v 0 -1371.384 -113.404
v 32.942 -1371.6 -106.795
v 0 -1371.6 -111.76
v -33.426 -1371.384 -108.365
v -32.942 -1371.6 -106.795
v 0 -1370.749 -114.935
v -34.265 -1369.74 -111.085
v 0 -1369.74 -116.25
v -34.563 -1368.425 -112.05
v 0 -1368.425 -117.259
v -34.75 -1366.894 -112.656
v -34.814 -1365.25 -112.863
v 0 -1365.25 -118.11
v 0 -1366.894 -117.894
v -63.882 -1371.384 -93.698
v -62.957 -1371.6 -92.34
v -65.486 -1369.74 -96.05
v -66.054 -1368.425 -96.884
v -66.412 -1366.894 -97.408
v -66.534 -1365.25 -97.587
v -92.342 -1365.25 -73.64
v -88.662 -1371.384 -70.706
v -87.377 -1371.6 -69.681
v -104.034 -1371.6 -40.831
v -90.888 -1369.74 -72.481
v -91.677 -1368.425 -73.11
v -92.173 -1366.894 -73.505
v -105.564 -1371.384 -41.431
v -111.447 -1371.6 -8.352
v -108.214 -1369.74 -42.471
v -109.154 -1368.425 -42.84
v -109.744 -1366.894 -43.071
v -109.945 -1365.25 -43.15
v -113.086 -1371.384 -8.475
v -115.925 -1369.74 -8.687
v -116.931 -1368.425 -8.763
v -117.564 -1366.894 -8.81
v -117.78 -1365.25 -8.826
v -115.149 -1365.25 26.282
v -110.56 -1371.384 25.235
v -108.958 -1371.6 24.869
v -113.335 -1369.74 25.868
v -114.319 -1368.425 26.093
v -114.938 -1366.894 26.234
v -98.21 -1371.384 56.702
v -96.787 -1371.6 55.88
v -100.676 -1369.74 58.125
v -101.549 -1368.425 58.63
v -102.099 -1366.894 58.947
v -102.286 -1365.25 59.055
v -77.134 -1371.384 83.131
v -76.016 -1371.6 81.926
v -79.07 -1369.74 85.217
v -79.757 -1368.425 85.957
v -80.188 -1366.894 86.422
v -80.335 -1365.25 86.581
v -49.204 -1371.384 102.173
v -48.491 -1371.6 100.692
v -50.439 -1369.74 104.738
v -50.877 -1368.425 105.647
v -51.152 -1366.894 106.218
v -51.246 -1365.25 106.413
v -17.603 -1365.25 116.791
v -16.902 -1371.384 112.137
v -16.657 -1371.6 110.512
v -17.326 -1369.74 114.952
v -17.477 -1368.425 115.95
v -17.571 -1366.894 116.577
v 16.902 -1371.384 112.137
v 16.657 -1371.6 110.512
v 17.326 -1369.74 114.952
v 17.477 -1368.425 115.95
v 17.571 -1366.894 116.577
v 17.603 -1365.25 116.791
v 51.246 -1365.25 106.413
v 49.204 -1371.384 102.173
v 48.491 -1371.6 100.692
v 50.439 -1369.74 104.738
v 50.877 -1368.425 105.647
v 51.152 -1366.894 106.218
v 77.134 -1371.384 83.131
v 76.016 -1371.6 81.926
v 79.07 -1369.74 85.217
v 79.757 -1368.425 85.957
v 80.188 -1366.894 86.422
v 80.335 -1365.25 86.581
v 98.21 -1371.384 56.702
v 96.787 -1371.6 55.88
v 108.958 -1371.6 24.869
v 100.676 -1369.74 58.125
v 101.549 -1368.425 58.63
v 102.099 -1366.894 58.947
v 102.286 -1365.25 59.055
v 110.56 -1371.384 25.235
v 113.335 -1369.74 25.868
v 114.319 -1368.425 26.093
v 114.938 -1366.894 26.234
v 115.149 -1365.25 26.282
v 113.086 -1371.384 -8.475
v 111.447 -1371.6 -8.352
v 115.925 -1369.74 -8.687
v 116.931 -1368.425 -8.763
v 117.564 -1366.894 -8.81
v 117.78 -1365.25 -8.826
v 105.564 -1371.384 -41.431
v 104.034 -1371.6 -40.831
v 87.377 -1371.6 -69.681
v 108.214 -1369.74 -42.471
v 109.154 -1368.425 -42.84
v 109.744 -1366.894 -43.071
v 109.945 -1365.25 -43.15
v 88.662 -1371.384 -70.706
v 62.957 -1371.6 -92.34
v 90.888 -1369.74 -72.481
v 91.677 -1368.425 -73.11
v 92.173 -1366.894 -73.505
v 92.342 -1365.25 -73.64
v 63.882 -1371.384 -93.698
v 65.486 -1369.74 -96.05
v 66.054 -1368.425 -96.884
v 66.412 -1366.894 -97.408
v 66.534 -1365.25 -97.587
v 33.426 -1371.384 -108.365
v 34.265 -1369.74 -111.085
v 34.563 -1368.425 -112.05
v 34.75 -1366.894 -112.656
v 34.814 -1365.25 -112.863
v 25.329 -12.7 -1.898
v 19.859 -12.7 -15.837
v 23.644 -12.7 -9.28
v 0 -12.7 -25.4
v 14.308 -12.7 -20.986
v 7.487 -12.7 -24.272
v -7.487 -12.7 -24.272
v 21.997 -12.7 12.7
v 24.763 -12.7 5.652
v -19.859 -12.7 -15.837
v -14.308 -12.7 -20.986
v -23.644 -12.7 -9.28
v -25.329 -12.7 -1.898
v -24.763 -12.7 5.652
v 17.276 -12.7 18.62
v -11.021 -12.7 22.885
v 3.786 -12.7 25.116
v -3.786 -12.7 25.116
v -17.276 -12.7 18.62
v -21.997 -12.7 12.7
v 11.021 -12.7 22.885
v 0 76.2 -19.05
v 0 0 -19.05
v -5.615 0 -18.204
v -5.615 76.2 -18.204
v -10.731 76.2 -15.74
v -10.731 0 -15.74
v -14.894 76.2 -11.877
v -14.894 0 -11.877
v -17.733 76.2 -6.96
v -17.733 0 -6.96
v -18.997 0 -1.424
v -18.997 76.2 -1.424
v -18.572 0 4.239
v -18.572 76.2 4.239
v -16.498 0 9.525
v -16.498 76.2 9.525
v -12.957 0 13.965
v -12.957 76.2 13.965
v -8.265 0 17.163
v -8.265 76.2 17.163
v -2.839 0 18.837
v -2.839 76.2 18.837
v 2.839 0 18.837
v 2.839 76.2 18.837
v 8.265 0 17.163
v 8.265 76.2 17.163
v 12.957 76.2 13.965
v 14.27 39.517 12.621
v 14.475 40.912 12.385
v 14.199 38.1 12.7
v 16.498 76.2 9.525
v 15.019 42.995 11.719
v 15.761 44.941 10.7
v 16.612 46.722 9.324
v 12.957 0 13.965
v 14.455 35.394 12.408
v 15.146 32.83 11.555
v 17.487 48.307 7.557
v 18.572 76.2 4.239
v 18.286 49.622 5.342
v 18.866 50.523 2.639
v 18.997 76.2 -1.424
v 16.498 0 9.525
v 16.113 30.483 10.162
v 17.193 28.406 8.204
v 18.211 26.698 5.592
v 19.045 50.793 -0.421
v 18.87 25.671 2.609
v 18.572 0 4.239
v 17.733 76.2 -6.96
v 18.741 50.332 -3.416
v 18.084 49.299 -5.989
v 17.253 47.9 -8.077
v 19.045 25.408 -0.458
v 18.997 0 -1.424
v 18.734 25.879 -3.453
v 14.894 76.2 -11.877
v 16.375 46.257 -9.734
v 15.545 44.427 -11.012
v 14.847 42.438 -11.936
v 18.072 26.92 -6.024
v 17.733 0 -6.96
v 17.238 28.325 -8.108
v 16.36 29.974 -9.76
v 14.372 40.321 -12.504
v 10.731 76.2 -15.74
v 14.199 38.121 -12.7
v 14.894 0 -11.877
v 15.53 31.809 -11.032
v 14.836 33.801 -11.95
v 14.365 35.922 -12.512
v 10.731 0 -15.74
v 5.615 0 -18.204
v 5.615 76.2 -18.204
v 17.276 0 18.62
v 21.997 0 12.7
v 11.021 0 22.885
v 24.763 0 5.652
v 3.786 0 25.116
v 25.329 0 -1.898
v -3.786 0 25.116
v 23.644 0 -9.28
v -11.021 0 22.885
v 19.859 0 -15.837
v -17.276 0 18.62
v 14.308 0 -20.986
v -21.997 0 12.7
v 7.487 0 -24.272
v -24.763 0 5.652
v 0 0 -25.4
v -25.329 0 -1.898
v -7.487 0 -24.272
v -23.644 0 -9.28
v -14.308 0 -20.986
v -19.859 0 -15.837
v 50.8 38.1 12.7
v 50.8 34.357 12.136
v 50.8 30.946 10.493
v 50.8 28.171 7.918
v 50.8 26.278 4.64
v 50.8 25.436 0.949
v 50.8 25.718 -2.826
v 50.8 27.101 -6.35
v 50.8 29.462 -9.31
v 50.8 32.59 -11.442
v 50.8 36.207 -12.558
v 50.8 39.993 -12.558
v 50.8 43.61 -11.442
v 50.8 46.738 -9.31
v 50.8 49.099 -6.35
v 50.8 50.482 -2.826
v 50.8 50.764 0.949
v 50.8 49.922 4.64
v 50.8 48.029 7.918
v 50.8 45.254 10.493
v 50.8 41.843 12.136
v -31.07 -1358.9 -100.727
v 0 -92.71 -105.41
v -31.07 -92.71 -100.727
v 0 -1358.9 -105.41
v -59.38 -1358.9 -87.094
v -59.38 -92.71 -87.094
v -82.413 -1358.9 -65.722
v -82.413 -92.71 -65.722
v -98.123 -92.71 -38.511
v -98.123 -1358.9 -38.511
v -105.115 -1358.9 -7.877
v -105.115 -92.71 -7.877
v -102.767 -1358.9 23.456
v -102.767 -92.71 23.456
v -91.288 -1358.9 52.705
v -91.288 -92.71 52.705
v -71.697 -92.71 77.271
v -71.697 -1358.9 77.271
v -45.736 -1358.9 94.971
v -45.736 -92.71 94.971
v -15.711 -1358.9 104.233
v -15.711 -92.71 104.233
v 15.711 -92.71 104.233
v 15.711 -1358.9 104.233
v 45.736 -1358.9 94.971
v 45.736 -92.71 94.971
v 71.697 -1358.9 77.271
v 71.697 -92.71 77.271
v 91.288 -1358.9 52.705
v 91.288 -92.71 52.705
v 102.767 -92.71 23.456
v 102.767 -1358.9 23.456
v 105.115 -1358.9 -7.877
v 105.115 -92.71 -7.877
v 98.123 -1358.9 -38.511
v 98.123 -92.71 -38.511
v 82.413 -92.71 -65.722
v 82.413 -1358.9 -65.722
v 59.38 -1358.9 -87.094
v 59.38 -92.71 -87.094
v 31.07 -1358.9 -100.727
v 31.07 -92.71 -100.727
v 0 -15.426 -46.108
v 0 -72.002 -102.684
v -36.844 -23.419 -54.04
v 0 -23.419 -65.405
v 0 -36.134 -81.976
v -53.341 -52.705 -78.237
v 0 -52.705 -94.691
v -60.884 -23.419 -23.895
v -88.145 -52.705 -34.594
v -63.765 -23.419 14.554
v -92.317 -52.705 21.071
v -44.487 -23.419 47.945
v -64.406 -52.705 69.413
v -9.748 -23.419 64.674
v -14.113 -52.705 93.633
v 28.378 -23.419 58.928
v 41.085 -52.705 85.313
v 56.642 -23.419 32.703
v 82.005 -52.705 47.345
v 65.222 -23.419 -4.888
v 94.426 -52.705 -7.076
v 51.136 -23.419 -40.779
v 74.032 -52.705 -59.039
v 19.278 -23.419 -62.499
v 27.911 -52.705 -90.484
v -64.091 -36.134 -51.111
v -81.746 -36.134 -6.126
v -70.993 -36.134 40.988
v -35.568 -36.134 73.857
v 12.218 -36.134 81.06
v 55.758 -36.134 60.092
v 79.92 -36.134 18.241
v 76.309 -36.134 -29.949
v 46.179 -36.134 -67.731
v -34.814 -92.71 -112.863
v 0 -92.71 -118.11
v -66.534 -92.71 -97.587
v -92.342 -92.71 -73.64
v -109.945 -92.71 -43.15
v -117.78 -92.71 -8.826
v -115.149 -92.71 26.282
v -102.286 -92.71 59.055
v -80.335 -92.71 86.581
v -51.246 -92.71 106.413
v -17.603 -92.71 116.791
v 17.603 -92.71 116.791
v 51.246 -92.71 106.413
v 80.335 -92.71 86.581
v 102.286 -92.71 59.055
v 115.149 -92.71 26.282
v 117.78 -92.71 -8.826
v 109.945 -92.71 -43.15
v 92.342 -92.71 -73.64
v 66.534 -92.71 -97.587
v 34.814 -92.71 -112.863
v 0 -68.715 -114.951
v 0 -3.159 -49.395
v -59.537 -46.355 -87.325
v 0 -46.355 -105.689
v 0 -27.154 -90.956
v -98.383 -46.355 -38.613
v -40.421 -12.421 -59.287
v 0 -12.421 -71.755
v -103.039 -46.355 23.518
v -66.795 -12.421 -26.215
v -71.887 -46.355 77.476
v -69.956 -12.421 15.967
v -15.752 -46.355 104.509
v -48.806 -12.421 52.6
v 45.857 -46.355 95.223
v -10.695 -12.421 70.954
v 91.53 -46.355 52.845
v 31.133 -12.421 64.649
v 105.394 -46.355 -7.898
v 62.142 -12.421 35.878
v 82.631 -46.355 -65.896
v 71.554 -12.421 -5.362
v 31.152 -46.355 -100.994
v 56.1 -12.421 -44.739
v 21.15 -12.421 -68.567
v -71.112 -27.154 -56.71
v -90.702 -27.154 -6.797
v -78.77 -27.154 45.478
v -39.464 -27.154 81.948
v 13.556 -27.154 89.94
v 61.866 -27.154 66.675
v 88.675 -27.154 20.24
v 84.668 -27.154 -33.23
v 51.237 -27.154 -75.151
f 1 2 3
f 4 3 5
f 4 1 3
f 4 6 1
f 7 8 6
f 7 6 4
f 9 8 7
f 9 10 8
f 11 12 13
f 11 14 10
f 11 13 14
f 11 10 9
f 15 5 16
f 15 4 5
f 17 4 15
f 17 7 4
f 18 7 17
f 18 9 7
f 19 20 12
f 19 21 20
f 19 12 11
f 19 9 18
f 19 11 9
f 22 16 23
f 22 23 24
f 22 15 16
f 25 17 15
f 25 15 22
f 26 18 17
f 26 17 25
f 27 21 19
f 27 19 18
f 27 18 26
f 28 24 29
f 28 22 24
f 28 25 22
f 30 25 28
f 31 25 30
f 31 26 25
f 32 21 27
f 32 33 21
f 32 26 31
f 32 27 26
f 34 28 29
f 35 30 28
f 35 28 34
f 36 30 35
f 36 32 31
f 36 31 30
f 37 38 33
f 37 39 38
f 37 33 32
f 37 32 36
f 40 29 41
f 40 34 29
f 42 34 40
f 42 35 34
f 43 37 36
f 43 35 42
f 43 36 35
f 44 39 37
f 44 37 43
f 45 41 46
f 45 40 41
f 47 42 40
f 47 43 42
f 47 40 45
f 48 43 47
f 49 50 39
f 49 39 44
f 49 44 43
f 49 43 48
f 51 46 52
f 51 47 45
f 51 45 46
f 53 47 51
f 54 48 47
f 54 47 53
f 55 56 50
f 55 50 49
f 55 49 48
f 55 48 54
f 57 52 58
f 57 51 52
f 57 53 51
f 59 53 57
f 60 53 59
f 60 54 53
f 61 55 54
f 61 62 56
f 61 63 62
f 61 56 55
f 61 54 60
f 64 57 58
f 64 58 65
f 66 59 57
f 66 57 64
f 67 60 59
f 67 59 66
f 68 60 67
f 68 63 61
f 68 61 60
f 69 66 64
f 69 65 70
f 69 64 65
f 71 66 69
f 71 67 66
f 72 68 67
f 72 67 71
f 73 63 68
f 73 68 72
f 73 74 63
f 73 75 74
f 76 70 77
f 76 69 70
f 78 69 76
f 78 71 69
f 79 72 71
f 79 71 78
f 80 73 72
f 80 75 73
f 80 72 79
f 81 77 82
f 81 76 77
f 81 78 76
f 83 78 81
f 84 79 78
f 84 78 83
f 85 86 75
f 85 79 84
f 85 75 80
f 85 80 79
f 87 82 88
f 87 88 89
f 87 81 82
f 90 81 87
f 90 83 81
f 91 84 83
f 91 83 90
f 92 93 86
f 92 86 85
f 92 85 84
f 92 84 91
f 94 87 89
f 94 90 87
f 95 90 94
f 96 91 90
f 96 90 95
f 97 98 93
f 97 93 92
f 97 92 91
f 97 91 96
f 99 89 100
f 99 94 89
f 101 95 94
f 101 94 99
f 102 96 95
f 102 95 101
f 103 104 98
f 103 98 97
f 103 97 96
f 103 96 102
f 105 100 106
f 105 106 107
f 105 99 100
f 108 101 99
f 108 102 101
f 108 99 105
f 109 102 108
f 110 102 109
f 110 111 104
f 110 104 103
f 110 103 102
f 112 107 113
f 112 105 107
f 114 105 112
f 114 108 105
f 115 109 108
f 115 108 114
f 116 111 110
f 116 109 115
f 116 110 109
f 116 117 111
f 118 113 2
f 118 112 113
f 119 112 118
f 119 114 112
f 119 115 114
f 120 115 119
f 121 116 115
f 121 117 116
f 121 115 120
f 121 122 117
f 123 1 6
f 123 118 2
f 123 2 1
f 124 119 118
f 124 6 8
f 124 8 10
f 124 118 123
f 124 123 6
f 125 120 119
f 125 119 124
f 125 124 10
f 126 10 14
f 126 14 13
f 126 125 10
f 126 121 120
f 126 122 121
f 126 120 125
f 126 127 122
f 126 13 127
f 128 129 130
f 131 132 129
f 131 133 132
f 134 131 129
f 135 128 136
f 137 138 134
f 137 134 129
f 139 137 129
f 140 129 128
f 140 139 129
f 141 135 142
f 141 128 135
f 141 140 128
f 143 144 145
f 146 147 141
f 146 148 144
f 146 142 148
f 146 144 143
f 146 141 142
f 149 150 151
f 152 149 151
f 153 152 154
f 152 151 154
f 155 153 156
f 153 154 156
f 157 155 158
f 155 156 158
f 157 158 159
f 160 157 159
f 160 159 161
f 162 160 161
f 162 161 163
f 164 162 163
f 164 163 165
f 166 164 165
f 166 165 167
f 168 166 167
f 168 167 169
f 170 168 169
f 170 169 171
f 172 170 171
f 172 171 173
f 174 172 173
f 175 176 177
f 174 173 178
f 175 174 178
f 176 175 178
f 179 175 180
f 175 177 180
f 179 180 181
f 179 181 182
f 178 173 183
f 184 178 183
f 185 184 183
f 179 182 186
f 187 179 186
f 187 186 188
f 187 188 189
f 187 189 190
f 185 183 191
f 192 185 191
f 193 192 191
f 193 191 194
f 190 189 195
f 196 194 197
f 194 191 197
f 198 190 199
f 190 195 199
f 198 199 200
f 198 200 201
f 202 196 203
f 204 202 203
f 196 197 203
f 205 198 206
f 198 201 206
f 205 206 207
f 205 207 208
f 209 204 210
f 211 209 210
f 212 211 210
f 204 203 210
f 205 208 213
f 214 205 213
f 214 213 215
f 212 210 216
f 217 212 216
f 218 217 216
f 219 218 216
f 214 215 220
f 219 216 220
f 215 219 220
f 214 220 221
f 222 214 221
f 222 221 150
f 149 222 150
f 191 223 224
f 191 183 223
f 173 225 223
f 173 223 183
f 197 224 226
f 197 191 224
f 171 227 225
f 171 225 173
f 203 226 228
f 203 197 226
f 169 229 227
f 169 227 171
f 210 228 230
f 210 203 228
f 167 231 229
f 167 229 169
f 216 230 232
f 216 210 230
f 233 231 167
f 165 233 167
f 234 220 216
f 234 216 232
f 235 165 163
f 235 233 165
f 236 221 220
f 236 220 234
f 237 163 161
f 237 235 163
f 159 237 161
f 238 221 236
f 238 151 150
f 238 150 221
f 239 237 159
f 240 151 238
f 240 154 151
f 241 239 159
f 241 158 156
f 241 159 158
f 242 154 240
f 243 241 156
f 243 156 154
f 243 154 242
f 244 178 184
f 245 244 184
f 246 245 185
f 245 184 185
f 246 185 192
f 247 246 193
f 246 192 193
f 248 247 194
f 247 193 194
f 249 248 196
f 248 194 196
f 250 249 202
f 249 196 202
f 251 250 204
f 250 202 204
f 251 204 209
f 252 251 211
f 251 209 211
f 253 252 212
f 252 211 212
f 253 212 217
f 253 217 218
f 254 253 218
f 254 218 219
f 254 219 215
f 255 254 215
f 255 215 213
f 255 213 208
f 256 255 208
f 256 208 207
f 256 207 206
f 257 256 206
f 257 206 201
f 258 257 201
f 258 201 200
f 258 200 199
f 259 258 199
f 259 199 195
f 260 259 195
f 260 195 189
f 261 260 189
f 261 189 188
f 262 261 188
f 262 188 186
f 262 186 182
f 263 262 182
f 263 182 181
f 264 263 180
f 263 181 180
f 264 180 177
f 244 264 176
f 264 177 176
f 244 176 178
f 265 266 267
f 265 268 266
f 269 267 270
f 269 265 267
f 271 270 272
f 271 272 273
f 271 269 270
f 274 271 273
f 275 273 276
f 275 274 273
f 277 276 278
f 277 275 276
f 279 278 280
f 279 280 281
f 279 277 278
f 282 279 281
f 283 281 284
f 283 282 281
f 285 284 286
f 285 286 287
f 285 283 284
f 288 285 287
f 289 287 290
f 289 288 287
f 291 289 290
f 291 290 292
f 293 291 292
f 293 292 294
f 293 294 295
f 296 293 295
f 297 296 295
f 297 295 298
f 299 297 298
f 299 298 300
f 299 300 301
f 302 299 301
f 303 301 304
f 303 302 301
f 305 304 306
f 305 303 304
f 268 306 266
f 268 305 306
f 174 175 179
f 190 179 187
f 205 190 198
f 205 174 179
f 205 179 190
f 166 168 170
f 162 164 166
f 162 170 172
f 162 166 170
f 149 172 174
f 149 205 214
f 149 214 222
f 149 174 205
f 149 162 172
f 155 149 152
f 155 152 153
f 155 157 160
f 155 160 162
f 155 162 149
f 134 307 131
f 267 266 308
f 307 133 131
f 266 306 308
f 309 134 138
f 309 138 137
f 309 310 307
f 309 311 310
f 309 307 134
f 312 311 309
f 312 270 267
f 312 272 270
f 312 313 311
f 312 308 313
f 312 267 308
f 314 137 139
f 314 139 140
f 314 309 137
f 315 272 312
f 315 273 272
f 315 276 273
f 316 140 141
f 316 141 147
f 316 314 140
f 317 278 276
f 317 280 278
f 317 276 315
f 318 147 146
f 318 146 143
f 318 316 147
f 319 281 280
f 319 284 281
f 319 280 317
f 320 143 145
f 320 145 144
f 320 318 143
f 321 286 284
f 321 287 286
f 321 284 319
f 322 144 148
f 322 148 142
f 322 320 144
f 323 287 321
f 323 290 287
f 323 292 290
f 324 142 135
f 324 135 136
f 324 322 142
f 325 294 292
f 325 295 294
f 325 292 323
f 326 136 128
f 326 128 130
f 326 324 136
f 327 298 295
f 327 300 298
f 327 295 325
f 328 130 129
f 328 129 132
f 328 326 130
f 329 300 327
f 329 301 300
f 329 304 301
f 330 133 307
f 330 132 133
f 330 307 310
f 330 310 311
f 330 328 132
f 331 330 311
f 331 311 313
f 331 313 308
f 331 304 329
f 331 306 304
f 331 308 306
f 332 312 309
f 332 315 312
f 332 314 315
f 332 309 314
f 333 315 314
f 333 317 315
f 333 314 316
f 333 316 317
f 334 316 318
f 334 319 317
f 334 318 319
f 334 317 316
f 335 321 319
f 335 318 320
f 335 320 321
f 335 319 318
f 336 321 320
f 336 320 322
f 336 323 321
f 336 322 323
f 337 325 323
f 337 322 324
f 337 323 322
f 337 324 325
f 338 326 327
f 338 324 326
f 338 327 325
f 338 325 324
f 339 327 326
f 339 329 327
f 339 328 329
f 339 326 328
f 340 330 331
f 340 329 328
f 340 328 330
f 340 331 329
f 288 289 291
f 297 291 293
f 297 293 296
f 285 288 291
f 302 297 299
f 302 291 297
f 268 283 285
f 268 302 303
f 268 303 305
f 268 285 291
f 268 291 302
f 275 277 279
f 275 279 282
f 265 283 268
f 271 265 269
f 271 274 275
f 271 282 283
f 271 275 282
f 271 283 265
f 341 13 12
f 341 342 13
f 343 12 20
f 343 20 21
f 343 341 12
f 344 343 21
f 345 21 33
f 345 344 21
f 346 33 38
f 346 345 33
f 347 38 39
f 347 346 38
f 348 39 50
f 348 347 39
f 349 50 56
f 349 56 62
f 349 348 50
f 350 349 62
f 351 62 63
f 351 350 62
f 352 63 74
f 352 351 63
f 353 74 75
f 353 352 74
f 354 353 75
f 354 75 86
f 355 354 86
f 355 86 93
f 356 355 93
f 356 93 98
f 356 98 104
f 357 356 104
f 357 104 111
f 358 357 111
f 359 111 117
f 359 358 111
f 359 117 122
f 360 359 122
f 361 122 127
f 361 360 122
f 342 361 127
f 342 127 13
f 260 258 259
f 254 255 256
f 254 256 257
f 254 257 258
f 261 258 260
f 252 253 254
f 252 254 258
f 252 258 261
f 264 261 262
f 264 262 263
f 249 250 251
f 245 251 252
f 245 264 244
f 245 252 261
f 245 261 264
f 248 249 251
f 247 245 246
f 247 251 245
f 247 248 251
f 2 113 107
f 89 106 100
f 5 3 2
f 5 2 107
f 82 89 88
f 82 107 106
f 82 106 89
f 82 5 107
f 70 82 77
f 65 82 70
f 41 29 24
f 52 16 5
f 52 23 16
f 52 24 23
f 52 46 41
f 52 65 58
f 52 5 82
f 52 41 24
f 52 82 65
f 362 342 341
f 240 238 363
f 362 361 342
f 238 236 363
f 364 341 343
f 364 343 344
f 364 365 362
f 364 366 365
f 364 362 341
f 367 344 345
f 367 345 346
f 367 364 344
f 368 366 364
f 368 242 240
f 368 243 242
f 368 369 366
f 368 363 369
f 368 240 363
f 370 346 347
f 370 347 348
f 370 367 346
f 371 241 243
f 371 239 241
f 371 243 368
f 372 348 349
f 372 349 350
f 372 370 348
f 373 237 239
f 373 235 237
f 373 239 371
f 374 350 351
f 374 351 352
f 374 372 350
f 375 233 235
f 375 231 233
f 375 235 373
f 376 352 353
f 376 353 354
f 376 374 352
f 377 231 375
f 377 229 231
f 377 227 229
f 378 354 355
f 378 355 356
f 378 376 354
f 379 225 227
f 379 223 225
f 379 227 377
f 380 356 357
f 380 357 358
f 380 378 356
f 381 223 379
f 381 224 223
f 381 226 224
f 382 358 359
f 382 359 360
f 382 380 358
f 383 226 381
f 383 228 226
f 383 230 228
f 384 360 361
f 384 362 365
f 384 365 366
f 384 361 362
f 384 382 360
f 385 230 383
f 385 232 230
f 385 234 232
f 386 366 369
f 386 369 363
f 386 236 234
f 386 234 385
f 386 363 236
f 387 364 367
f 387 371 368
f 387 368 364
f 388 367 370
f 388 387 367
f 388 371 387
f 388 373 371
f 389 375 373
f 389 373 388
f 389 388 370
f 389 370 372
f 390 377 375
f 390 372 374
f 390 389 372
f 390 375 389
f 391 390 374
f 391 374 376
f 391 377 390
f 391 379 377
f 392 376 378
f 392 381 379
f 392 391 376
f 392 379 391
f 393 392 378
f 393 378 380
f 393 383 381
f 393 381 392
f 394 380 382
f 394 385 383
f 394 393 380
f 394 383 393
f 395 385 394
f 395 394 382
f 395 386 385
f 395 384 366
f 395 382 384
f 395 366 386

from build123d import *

# Parameters (mm, degrees)
SKETCH2_R           = 19.05
BOSS_EXTRUDE1_DEPTH = 76.2
SKETCH3_R           = 12.7
BOSS_EXTRUDE2_DEPTH = 50.8


with BuildPart() as part:
    # Sketch1 → Revolve1 (revolve)
    with BuildSketch(Plane.XY, mode=Mode.PRIVATE) as revolve1_sk:
        with BuildLine():
            Line((0, -1371.6), (111.76, -1371.6))
            ThreePointArc((111.76, -1371.6), (116.250128061, -1369.740128061), (118.11, -1365.25))
            Line((118.11, -1365.25), (118.11, -92.71))
            ThreePointArc((118.11, -92.71), (90.955869684, -27.154130316), (25.4, 0))
            Line((25.4, 0), (0, 0))
            Line((0, 0), (0, -12.7))
            Line((0, -12.7), (25.4, -12.7))
            ThreePointArc((25.4, -12.7), (81.975613563, -36.134386437), (105.41, -92.71))
            Line((105.41, -92.71), (105.41, -1358.9))
            Line((105.41, -1358.9), (0, -1358.9))
            Line((0, -1358.9), (0, -1371.6))
        make_face()
    revolve(revolve1_sk.sketch.rotate(Axis((0, -1371.6, 0), (0, 1, 0)), 90), axis=Axis((0, -1371.6, 0), (0, 1, 0)))

    # Sketch2 → Boss-Extrude1 (add)
    with BuildSketch(Plane(origin=(0, 0, 0), x_dir=(1, 0, 0), z_dir=(0, 1, 0))):
        with Locations(Location((0, 0, 0), (0, 0, 90))):
            Circle(SKETCH2_R)
    extrude(amount=BOSS_EXTRUDE1_DEPTH)

    # Sketch3 → Boss-Extrude2 (add)
    with BuildSketch(Plane(origin=(0, 0, 0), x_dir=(0, 0, -1), z_dir=(1, 0, 0))):
        with Locations(Location((0, 38.1, 0), (0, 0, 180))):
            Circle(SKETCH3_R)
    extrude(amount=BOSS_EXTRUDE2_DEPTH)


solid = part.part
